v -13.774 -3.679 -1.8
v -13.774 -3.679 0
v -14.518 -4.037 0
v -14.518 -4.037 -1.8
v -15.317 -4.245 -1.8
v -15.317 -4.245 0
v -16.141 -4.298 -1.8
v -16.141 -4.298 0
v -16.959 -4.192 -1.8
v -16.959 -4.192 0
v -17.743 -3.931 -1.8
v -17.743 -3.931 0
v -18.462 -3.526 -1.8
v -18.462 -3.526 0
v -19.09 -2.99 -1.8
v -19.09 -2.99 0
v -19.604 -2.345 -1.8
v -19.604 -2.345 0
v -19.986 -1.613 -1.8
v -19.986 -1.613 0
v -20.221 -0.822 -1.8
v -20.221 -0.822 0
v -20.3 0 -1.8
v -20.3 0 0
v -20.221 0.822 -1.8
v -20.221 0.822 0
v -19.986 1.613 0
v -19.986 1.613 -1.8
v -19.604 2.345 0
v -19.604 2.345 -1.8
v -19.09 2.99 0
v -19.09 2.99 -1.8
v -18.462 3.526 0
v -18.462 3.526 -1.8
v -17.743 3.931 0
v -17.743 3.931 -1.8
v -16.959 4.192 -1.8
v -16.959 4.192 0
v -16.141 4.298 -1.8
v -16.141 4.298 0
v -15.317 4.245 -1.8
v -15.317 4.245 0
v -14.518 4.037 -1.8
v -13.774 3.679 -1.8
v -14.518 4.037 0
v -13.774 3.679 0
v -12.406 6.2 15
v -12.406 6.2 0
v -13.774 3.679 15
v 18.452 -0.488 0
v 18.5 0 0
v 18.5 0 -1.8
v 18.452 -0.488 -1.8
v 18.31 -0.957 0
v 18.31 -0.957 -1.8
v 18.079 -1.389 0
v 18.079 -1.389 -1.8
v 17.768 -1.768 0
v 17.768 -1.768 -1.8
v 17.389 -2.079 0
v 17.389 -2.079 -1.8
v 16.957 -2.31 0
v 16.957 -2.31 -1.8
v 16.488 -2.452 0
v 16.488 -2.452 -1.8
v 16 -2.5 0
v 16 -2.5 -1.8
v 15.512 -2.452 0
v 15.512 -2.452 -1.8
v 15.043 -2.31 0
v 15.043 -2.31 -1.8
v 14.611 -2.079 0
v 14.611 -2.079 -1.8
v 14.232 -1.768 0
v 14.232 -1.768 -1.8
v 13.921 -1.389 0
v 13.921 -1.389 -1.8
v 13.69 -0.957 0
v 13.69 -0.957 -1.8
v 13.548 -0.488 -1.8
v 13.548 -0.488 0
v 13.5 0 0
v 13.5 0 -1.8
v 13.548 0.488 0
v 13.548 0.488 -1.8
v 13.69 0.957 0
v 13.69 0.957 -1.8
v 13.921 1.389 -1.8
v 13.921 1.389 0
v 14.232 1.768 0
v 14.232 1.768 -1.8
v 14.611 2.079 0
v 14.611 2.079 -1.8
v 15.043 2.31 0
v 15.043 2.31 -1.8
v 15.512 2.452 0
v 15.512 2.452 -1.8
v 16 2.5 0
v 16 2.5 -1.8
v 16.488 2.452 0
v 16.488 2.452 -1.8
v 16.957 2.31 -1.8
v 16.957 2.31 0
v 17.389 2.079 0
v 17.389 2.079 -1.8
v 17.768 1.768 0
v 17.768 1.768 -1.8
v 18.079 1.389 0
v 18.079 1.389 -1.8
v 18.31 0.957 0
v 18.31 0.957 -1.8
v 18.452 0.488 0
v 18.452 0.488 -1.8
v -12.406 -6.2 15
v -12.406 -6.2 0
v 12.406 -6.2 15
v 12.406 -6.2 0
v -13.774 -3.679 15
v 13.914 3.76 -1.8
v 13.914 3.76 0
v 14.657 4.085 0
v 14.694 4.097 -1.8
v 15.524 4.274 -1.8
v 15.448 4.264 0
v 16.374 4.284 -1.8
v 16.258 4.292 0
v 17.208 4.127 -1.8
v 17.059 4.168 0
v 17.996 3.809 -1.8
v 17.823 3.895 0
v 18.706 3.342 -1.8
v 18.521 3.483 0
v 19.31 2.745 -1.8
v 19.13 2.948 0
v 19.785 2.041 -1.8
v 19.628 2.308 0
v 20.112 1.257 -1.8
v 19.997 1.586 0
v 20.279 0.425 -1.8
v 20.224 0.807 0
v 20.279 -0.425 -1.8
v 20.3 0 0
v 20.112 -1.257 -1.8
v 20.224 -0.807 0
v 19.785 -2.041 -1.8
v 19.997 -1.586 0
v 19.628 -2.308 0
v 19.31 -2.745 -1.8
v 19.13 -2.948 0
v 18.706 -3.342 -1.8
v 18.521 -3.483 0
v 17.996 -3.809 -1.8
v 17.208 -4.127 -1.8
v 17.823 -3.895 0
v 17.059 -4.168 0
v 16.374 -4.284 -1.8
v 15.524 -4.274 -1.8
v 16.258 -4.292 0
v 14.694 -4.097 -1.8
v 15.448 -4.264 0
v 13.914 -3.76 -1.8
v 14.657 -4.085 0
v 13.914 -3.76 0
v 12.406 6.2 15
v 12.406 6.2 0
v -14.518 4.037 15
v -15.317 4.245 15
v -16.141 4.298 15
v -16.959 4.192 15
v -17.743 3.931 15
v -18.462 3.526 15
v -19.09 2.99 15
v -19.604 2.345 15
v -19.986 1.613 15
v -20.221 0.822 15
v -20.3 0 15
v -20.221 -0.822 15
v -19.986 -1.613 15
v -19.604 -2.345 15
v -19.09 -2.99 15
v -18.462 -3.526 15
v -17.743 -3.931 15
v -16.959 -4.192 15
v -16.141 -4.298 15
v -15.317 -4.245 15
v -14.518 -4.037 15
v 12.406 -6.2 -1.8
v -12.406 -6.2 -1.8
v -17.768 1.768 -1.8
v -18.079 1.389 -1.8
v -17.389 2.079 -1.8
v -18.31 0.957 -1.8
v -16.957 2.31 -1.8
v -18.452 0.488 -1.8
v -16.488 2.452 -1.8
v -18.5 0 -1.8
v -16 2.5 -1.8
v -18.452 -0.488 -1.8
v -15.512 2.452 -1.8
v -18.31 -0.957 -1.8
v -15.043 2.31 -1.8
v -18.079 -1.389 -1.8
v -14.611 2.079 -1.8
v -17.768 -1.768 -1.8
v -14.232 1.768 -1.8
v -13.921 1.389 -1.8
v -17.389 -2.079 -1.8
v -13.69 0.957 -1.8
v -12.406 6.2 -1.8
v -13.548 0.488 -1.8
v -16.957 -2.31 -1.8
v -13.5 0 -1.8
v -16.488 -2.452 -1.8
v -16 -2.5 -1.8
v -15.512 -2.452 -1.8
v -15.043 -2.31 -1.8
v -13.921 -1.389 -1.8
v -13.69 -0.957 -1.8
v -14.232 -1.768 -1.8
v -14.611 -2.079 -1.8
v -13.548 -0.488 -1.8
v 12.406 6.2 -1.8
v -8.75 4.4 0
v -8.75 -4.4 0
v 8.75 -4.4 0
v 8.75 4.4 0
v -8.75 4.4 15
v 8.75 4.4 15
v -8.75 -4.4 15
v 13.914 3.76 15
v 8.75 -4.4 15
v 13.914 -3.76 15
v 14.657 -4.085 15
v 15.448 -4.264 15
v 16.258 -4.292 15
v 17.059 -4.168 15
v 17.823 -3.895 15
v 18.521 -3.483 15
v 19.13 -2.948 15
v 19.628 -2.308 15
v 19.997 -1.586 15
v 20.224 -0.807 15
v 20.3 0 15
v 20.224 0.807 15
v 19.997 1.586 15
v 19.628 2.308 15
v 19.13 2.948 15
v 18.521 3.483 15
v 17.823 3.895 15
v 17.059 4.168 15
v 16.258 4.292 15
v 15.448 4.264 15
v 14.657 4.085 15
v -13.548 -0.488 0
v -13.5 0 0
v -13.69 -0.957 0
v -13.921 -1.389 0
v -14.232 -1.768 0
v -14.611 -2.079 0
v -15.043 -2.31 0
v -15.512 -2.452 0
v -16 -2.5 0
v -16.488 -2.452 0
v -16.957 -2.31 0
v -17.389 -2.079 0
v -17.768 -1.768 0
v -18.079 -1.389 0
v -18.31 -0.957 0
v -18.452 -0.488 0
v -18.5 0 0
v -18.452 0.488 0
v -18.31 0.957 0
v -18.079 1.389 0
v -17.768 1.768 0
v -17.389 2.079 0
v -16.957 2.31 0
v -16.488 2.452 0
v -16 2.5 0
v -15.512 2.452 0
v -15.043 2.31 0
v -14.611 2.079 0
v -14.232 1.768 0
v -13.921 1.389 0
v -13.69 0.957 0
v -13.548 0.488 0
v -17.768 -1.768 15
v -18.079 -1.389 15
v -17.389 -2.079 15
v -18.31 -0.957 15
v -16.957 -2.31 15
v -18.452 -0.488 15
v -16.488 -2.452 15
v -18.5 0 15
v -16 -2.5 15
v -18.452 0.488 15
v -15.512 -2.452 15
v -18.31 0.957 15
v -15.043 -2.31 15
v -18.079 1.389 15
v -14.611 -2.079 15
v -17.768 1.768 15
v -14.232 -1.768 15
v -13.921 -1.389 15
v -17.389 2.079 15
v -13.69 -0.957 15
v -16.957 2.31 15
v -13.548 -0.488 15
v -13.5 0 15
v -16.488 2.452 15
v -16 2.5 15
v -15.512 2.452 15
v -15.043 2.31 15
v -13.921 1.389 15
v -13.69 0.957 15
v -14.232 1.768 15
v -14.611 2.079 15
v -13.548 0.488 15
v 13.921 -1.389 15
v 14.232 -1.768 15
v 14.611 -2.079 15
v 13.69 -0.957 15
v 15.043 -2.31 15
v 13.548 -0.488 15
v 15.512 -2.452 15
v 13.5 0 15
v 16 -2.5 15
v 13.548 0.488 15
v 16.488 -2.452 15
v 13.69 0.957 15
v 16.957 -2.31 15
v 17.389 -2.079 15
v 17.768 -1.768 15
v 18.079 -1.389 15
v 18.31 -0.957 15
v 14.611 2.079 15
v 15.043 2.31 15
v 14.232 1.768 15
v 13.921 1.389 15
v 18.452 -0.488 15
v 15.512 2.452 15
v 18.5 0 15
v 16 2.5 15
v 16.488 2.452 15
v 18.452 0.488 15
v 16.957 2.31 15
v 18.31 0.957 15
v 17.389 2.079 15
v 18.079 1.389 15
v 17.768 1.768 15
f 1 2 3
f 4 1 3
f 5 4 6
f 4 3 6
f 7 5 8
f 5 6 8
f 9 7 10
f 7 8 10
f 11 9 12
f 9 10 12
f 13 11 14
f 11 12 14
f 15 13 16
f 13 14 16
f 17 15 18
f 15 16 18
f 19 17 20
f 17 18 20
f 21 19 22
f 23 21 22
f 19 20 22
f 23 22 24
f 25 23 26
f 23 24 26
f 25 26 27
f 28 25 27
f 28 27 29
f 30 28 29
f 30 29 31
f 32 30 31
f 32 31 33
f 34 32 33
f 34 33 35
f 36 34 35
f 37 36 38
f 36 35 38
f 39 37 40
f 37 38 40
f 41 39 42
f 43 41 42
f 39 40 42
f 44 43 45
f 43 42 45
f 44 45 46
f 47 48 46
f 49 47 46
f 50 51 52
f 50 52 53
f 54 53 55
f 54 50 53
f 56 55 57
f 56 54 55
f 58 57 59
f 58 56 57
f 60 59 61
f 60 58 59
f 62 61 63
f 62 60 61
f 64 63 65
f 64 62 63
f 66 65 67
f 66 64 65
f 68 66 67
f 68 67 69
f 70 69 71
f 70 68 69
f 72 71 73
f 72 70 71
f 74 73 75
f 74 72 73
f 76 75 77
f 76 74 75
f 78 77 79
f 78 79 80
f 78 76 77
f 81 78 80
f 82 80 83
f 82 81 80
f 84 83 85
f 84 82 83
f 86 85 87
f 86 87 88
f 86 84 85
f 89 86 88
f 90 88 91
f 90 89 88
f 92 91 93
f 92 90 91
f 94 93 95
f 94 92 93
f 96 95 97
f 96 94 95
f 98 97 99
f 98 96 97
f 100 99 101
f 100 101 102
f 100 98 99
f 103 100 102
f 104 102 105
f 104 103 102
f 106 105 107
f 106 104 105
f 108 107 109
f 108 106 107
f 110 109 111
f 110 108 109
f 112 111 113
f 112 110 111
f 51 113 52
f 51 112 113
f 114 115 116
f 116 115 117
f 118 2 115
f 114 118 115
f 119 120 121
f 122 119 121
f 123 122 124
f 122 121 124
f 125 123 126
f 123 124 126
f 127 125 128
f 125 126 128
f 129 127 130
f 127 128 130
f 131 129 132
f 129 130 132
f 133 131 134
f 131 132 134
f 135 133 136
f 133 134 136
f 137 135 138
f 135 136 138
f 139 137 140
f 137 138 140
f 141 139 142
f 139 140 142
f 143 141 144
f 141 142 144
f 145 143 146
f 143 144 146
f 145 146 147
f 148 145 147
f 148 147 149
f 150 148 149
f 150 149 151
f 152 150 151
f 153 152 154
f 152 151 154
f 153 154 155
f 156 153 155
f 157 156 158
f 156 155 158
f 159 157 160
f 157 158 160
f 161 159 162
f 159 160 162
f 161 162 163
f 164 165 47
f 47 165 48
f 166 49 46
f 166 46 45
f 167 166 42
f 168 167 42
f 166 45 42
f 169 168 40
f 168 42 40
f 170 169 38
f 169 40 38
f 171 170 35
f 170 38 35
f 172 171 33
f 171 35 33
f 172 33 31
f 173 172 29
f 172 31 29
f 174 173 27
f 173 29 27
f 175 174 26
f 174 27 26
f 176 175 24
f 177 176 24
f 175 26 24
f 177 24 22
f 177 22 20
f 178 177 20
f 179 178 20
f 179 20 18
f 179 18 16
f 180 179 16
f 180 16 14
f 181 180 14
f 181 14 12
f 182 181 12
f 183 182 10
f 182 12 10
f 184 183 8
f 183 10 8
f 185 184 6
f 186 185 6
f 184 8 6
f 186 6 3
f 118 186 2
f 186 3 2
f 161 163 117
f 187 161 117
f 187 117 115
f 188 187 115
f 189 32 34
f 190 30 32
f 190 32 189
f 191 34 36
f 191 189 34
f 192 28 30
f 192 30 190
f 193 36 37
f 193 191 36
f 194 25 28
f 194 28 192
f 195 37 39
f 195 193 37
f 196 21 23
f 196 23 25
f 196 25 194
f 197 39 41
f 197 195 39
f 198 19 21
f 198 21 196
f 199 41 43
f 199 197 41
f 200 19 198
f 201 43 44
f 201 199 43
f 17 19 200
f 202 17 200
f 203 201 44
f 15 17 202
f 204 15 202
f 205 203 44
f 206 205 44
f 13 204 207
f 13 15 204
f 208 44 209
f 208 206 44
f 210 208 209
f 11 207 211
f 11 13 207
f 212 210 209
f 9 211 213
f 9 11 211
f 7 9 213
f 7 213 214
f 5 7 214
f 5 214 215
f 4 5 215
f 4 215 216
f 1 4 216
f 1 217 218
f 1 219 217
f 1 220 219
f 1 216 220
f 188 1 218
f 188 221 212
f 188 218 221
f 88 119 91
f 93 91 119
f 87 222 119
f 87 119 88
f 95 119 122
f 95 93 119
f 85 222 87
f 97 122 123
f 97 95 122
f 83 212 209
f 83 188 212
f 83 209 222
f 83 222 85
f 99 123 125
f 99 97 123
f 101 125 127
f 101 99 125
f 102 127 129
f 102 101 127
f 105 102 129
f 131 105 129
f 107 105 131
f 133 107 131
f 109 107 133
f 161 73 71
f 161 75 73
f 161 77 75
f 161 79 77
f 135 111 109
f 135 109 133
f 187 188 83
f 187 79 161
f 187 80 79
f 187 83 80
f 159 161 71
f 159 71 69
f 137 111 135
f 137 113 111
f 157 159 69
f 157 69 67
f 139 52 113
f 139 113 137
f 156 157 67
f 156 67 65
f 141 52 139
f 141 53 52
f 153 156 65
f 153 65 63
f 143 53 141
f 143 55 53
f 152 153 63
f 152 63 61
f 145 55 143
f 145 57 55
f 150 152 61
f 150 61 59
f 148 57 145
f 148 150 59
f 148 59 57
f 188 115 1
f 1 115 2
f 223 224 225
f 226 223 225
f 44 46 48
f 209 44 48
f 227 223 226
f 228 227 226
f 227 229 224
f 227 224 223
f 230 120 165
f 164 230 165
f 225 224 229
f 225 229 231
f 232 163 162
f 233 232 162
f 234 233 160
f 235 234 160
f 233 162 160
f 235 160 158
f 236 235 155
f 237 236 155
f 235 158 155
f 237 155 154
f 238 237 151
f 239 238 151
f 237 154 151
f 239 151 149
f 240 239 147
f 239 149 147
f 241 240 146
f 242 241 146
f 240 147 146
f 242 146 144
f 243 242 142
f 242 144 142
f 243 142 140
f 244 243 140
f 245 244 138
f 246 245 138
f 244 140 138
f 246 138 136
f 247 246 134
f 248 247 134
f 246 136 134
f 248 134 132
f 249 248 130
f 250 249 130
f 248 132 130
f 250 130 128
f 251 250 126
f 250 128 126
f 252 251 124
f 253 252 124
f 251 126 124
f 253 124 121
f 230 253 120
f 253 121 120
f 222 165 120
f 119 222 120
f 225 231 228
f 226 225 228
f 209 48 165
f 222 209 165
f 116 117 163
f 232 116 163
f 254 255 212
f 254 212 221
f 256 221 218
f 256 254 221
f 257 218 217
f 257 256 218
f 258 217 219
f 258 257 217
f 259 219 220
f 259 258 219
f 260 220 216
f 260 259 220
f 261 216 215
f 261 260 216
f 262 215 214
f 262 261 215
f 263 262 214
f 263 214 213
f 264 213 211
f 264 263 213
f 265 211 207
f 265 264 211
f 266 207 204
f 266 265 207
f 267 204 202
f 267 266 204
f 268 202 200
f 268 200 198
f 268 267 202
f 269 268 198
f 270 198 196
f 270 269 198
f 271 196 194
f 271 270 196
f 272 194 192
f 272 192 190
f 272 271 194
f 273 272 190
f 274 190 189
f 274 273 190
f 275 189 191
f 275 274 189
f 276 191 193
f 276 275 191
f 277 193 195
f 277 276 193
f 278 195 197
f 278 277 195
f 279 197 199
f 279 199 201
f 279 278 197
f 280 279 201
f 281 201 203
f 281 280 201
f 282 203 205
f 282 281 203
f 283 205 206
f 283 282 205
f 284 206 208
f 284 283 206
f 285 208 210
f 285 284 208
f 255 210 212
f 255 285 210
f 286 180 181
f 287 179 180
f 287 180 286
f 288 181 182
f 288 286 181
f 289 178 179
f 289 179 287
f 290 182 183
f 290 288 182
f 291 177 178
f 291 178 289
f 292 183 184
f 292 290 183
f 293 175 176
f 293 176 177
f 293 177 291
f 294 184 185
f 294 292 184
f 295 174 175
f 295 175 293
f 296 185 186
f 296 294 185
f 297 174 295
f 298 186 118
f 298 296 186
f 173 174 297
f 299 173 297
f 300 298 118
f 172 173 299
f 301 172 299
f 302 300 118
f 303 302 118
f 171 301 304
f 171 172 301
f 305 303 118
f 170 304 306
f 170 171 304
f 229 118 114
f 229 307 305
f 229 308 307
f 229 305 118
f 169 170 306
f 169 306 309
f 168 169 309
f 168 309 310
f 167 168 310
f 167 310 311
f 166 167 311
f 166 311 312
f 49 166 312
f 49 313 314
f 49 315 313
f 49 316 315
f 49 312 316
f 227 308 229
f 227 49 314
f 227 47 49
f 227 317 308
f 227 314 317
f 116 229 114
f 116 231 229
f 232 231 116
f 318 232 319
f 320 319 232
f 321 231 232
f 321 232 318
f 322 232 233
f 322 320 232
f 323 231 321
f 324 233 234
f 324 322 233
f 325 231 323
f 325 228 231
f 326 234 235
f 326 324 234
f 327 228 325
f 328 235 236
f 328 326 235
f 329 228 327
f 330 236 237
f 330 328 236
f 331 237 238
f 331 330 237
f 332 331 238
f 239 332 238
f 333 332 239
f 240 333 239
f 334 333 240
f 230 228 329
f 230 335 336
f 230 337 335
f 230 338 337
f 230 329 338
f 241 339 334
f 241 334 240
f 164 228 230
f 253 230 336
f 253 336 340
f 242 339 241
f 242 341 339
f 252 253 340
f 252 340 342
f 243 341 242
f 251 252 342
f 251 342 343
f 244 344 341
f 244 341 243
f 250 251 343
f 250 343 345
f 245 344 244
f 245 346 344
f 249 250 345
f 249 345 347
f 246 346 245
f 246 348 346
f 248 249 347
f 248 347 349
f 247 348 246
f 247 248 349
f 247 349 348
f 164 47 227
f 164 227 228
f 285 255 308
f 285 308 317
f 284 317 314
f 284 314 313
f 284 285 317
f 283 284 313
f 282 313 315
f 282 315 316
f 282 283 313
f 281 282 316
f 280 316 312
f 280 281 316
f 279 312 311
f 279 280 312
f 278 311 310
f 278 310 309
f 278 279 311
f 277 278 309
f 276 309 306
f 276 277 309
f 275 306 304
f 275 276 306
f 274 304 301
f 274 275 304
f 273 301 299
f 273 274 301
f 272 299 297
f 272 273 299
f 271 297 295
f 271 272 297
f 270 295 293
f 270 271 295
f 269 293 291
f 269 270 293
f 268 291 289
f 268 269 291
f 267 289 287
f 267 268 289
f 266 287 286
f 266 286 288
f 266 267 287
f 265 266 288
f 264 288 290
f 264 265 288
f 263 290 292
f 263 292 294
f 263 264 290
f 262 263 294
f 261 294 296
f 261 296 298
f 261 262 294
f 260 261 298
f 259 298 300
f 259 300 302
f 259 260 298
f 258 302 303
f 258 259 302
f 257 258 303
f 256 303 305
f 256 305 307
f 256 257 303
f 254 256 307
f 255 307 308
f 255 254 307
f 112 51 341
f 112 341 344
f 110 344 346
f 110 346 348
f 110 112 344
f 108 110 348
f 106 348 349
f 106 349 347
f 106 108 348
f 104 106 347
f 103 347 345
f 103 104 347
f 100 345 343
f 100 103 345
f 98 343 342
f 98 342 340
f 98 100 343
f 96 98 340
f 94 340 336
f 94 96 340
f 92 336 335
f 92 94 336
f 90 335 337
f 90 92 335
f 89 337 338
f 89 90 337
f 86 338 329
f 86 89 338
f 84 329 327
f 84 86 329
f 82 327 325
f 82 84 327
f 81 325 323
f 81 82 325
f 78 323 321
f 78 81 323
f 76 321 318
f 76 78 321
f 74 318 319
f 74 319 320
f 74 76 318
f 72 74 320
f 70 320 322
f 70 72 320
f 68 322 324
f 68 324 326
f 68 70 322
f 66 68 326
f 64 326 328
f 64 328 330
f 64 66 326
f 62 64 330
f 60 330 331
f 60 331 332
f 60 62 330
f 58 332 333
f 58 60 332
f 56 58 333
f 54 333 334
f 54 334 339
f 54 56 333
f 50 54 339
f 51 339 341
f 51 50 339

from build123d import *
from build123d import SkipClean  # not in build123d's __all__

# Parameters (mm, degrees)
F2_R     = 2.5
F2_W     = 17.5
F2_H     = 8.8
F3_DEPTH = 15
F4_R     = 2.5
F4_W     = 17.5
F4_H     = 8.8
F5_DEPTH = 1.8


with BuildPart() as f3:
    # F2 (on Top) → F3 (new body)
    with BuildSketch(Plane.XY):
        with BuildLine():
            ThreePointArc((-13.7742425586, -3.6791308501), (-12.2542853153, -2.1117815941), (-11.7, 0))
            ThreePointArc((-11.7, 0), (-12.2542853153, 2.1117815941), (-13.7742425586, 3.6791308501))
            ThreePointArc((-13.7742425586, 3.6791308501), (-20.3, 0), (-13.7742425586, -3.6791308501))
        make_face()
        with Locations((-16, 0)):
            Circle(F2_R, mode=Mode.SUBTRACT)
        with BuildLine():
            ThreePointArc((-13.7742425586, 3.6791308501), (-12.2542853153, 2.1117815941), (-11.7, 0))
            ThreePointArc((-11.7, 0), (-12.2542853153, -2.1117815941), (-13.7742425586, -3.6791308501))
            Line((-13.7742425586, -3.6791308501), (-12.4064937305, -6.2))
            Line((-12.4064937305, -6.2), (0, -6.2))
            Line((0, -6.2), (12.4064937305, -6.2))
            Line((12.4064937305, -6.2), (13.913982062, -3.7601235568))
            ThreePointArc((13.913982062, -3.7601235568), (11.7, 0), (13.913982062, 3.7601235568))
            Line((13.913982062, 3.7601235568), (12.4064937305, 6.2))
            Line((12.4064937305, 6.2), (0, 6.2))
            Line((0, 6.2), (-12.4064937305, 6.2))
            Line((-12.4064937305, 6.2), (-13.7742425586, 3.6791308501))
        make_face()
        Rectangle(F2_W, F2_H, mode=Mode.SUBTRACT)
        with BuildLine():
            ThreePointArc((20.3, 0), (18.1817565019, 3.705393173), (13.913982062, 3.7601235568))
            ThreePointArc((13.913982062, 3.7601235568), (11.7, 0), (13.913982062, -3.7601235568))
            ThreePointArc((13.913982062, -3.7601235568), (18.1817565019, -3.705393173), (20.3, 0))
        make_face()
        with Locations((16, 0)):
            Circle(F2_R, mode=Mode.SUBTRACT)
    extrude(amount=F3_DEPTH)

    # F4 (on face) → F5 (join)
    with BuildSketch(Plane(origin=(0, 0, 0), x_dir=(1, 0, 0), z_dir=(0, 0, -1))):
        with BuildLine():
            Line((-12.4064937305, 6.2), (-13.7742425586, 3.6791308501))
            ThreePointArc((-13.7742425586, 3.6791308501), (-20.3, 0), (-13.7742425586, -3.6791308501))
            Line((-13.7742425586, -3.6791308501), (-12.4064937305, -6.2))
            Line((-12.4064937305, -6.2), (12.4064937305, -6.2))
            Line((12.4064937305, -6.2), (13.913982062, -3.7601235568))
            ThreePointArc((13.913982062, -3.7601235568), (20.3, 0), (13.913982062, 3.7601235568))
            Line((13.913982062, 3.7601235568), (12.4064937305, 6.2))
            Line((12.4064937305, 6.2), (-12.4064937305, 6.2))
        make_face()
        with Locations((-16, 0)):
            Circle(F4_R, mode=Mode.SUBTRACT)
        Rectangle(F4_W, F4_H, mode=Mode.SUBTRACT)
        with Locations((16, 0)):
            Circle(F4_R, mode=Mode.SUBTRACT)
        Rectangle(F4_W, F4_H)
    with SkipClean():  # cleaning this boolean's faces spoils the solid; the shape is the same uncleaned
        extrude(amount=F5_DEPTH)


solid = f3.part
